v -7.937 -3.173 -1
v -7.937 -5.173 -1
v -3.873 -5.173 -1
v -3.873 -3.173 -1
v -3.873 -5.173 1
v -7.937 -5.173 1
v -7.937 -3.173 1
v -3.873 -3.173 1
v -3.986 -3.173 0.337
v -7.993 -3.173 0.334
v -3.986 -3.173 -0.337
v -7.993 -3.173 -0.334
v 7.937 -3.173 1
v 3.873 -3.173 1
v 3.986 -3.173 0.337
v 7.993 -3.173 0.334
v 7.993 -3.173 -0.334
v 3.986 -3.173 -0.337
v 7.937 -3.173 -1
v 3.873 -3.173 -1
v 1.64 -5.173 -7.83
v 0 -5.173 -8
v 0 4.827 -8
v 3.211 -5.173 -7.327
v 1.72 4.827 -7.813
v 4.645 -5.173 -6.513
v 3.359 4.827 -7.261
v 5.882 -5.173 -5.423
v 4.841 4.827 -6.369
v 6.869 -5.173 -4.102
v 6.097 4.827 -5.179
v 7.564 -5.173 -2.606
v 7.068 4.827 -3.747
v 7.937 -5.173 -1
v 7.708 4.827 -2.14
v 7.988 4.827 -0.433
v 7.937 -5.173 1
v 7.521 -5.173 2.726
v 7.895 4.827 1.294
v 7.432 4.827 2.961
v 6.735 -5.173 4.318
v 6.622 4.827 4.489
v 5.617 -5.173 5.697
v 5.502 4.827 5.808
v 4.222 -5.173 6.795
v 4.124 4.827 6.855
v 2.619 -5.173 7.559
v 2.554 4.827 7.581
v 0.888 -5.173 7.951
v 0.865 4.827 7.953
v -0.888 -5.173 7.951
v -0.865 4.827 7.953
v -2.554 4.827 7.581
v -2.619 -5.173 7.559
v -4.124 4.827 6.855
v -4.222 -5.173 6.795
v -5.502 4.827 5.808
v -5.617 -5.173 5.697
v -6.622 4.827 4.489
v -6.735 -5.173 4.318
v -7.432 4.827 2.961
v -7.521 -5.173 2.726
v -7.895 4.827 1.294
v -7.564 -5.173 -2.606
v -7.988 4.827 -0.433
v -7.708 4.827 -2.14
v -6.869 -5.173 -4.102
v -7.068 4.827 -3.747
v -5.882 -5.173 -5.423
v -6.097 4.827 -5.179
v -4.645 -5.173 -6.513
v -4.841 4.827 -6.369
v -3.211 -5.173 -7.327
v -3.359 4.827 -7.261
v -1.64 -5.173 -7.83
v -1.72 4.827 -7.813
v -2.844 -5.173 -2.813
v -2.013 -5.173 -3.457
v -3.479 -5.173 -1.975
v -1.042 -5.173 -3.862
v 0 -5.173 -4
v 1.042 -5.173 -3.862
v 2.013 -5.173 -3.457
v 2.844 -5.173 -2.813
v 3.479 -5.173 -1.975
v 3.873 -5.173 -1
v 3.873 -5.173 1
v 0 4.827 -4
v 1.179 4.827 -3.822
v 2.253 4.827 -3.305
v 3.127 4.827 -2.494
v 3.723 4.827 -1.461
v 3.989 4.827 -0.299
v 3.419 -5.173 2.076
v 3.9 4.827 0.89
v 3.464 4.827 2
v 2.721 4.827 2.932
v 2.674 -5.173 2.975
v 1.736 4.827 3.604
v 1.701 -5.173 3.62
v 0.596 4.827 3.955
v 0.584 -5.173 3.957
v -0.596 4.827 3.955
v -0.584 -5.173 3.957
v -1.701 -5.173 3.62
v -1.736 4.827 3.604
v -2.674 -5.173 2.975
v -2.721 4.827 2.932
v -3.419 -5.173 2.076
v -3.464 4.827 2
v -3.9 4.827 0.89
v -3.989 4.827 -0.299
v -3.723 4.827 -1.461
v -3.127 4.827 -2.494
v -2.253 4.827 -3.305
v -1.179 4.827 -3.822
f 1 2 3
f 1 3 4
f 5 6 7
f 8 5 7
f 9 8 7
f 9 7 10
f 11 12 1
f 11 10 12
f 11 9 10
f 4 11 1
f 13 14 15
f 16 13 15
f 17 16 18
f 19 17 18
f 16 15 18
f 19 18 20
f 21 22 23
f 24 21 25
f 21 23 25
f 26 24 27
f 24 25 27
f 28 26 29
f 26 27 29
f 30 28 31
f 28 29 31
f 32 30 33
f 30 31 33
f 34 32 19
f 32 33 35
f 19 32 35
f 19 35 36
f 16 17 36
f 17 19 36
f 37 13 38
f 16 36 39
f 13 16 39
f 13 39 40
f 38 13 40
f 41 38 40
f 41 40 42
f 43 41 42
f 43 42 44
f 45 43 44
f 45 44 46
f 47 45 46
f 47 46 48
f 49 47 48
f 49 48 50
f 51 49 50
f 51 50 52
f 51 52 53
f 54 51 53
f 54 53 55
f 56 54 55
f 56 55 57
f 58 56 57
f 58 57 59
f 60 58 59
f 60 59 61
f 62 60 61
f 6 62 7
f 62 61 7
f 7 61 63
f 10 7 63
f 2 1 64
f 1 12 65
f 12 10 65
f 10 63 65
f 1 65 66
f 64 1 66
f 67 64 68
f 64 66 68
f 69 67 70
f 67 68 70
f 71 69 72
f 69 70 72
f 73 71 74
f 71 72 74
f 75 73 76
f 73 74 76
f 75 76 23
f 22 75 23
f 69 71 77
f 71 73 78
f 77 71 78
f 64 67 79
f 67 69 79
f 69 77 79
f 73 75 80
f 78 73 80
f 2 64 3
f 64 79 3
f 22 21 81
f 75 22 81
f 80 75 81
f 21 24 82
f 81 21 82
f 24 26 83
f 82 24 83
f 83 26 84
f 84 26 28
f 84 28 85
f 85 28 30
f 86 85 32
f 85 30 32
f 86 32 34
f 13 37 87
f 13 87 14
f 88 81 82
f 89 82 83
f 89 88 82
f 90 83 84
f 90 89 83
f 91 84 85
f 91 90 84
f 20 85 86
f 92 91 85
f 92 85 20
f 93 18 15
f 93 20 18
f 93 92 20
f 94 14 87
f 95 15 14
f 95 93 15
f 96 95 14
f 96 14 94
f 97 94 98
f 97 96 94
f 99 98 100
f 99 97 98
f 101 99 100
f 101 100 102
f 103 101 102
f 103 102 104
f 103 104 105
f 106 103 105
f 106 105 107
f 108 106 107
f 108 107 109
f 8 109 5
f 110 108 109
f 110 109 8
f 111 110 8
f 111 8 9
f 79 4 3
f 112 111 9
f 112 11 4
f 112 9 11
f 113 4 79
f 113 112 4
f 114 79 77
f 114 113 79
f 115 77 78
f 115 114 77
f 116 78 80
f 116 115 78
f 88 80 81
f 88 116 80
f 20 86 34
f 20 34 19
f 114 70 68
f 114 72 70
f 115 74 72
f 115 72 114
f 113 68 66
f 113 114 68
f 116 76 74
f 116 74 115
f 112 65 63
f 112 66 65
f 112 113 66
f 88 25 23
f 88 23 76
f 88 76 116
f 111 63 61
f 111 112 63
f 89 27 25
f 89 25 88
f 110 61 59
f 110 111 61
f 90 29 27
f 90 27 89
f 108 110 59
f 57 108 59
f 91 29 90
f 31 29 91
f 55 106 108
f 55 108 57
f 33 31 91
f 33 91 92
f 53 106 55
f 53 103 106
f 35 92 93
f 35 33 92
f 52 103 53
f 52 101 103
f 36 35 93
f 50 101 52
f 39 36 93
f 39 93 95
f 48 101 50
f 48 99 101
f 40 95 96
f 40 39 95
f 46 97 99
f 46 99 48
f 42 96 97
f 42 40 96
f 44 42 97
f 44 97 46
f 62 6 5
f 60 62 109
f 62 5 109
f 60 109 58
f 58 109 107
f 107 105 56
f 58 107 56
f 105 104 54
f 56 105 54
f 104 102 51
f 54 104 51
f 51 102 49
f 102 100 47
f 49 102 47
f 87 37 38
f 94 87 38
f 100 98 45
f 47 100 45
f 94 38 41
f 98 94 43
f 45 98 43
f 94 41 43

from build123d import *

# Parameters (mm, degrees)
SKETCH2_W               = 4
SKETCH2_H               = 10
SKETCH3_W               = 2
SKETCH3_H               = 2
CUT_EXTRUDE1_DEPTH      = 9
CUT_EXTRUDE1_DEPTH_BACK = 9


with BuildPart() as part:
    # Sketch2 → Revolve1 (revolve)
    with BuildSketch(Plane(origin=(0, 0, 0), x_dir=(0, 0, -1), z_dir=(1, 0, 0))):
        with Locations((6, -0.173076923)):
            Rectangle(SKETCH2_W, SKETCH2_H)
    revolve(axis=Axis((0, 8.057692308, 0), (0, -1, 0)))

    # Sketch3 → Cut-Extrude1 (cut, two sides)
    with BuildSketch(Plane(origin=(0, 0, 0), x_dir=(0, 0, -1), z_dir=(1, 0, 0))) as cut_extrude1_sk:
        with Locations((0, -4.173076923)):
            Rectangle(SKETCH3_W, SKETCH3_H)
    extrude(amount=CUT_EXTRUDE1_DEPTH, mode=Mode.SUBTRACT)
    extrude(cut_extrude1_sk.sketch, amount=-CUT_EXTRUDE1_DEPTH_BACK, mode=Mode.SUBTRACT)


solid = part.part
